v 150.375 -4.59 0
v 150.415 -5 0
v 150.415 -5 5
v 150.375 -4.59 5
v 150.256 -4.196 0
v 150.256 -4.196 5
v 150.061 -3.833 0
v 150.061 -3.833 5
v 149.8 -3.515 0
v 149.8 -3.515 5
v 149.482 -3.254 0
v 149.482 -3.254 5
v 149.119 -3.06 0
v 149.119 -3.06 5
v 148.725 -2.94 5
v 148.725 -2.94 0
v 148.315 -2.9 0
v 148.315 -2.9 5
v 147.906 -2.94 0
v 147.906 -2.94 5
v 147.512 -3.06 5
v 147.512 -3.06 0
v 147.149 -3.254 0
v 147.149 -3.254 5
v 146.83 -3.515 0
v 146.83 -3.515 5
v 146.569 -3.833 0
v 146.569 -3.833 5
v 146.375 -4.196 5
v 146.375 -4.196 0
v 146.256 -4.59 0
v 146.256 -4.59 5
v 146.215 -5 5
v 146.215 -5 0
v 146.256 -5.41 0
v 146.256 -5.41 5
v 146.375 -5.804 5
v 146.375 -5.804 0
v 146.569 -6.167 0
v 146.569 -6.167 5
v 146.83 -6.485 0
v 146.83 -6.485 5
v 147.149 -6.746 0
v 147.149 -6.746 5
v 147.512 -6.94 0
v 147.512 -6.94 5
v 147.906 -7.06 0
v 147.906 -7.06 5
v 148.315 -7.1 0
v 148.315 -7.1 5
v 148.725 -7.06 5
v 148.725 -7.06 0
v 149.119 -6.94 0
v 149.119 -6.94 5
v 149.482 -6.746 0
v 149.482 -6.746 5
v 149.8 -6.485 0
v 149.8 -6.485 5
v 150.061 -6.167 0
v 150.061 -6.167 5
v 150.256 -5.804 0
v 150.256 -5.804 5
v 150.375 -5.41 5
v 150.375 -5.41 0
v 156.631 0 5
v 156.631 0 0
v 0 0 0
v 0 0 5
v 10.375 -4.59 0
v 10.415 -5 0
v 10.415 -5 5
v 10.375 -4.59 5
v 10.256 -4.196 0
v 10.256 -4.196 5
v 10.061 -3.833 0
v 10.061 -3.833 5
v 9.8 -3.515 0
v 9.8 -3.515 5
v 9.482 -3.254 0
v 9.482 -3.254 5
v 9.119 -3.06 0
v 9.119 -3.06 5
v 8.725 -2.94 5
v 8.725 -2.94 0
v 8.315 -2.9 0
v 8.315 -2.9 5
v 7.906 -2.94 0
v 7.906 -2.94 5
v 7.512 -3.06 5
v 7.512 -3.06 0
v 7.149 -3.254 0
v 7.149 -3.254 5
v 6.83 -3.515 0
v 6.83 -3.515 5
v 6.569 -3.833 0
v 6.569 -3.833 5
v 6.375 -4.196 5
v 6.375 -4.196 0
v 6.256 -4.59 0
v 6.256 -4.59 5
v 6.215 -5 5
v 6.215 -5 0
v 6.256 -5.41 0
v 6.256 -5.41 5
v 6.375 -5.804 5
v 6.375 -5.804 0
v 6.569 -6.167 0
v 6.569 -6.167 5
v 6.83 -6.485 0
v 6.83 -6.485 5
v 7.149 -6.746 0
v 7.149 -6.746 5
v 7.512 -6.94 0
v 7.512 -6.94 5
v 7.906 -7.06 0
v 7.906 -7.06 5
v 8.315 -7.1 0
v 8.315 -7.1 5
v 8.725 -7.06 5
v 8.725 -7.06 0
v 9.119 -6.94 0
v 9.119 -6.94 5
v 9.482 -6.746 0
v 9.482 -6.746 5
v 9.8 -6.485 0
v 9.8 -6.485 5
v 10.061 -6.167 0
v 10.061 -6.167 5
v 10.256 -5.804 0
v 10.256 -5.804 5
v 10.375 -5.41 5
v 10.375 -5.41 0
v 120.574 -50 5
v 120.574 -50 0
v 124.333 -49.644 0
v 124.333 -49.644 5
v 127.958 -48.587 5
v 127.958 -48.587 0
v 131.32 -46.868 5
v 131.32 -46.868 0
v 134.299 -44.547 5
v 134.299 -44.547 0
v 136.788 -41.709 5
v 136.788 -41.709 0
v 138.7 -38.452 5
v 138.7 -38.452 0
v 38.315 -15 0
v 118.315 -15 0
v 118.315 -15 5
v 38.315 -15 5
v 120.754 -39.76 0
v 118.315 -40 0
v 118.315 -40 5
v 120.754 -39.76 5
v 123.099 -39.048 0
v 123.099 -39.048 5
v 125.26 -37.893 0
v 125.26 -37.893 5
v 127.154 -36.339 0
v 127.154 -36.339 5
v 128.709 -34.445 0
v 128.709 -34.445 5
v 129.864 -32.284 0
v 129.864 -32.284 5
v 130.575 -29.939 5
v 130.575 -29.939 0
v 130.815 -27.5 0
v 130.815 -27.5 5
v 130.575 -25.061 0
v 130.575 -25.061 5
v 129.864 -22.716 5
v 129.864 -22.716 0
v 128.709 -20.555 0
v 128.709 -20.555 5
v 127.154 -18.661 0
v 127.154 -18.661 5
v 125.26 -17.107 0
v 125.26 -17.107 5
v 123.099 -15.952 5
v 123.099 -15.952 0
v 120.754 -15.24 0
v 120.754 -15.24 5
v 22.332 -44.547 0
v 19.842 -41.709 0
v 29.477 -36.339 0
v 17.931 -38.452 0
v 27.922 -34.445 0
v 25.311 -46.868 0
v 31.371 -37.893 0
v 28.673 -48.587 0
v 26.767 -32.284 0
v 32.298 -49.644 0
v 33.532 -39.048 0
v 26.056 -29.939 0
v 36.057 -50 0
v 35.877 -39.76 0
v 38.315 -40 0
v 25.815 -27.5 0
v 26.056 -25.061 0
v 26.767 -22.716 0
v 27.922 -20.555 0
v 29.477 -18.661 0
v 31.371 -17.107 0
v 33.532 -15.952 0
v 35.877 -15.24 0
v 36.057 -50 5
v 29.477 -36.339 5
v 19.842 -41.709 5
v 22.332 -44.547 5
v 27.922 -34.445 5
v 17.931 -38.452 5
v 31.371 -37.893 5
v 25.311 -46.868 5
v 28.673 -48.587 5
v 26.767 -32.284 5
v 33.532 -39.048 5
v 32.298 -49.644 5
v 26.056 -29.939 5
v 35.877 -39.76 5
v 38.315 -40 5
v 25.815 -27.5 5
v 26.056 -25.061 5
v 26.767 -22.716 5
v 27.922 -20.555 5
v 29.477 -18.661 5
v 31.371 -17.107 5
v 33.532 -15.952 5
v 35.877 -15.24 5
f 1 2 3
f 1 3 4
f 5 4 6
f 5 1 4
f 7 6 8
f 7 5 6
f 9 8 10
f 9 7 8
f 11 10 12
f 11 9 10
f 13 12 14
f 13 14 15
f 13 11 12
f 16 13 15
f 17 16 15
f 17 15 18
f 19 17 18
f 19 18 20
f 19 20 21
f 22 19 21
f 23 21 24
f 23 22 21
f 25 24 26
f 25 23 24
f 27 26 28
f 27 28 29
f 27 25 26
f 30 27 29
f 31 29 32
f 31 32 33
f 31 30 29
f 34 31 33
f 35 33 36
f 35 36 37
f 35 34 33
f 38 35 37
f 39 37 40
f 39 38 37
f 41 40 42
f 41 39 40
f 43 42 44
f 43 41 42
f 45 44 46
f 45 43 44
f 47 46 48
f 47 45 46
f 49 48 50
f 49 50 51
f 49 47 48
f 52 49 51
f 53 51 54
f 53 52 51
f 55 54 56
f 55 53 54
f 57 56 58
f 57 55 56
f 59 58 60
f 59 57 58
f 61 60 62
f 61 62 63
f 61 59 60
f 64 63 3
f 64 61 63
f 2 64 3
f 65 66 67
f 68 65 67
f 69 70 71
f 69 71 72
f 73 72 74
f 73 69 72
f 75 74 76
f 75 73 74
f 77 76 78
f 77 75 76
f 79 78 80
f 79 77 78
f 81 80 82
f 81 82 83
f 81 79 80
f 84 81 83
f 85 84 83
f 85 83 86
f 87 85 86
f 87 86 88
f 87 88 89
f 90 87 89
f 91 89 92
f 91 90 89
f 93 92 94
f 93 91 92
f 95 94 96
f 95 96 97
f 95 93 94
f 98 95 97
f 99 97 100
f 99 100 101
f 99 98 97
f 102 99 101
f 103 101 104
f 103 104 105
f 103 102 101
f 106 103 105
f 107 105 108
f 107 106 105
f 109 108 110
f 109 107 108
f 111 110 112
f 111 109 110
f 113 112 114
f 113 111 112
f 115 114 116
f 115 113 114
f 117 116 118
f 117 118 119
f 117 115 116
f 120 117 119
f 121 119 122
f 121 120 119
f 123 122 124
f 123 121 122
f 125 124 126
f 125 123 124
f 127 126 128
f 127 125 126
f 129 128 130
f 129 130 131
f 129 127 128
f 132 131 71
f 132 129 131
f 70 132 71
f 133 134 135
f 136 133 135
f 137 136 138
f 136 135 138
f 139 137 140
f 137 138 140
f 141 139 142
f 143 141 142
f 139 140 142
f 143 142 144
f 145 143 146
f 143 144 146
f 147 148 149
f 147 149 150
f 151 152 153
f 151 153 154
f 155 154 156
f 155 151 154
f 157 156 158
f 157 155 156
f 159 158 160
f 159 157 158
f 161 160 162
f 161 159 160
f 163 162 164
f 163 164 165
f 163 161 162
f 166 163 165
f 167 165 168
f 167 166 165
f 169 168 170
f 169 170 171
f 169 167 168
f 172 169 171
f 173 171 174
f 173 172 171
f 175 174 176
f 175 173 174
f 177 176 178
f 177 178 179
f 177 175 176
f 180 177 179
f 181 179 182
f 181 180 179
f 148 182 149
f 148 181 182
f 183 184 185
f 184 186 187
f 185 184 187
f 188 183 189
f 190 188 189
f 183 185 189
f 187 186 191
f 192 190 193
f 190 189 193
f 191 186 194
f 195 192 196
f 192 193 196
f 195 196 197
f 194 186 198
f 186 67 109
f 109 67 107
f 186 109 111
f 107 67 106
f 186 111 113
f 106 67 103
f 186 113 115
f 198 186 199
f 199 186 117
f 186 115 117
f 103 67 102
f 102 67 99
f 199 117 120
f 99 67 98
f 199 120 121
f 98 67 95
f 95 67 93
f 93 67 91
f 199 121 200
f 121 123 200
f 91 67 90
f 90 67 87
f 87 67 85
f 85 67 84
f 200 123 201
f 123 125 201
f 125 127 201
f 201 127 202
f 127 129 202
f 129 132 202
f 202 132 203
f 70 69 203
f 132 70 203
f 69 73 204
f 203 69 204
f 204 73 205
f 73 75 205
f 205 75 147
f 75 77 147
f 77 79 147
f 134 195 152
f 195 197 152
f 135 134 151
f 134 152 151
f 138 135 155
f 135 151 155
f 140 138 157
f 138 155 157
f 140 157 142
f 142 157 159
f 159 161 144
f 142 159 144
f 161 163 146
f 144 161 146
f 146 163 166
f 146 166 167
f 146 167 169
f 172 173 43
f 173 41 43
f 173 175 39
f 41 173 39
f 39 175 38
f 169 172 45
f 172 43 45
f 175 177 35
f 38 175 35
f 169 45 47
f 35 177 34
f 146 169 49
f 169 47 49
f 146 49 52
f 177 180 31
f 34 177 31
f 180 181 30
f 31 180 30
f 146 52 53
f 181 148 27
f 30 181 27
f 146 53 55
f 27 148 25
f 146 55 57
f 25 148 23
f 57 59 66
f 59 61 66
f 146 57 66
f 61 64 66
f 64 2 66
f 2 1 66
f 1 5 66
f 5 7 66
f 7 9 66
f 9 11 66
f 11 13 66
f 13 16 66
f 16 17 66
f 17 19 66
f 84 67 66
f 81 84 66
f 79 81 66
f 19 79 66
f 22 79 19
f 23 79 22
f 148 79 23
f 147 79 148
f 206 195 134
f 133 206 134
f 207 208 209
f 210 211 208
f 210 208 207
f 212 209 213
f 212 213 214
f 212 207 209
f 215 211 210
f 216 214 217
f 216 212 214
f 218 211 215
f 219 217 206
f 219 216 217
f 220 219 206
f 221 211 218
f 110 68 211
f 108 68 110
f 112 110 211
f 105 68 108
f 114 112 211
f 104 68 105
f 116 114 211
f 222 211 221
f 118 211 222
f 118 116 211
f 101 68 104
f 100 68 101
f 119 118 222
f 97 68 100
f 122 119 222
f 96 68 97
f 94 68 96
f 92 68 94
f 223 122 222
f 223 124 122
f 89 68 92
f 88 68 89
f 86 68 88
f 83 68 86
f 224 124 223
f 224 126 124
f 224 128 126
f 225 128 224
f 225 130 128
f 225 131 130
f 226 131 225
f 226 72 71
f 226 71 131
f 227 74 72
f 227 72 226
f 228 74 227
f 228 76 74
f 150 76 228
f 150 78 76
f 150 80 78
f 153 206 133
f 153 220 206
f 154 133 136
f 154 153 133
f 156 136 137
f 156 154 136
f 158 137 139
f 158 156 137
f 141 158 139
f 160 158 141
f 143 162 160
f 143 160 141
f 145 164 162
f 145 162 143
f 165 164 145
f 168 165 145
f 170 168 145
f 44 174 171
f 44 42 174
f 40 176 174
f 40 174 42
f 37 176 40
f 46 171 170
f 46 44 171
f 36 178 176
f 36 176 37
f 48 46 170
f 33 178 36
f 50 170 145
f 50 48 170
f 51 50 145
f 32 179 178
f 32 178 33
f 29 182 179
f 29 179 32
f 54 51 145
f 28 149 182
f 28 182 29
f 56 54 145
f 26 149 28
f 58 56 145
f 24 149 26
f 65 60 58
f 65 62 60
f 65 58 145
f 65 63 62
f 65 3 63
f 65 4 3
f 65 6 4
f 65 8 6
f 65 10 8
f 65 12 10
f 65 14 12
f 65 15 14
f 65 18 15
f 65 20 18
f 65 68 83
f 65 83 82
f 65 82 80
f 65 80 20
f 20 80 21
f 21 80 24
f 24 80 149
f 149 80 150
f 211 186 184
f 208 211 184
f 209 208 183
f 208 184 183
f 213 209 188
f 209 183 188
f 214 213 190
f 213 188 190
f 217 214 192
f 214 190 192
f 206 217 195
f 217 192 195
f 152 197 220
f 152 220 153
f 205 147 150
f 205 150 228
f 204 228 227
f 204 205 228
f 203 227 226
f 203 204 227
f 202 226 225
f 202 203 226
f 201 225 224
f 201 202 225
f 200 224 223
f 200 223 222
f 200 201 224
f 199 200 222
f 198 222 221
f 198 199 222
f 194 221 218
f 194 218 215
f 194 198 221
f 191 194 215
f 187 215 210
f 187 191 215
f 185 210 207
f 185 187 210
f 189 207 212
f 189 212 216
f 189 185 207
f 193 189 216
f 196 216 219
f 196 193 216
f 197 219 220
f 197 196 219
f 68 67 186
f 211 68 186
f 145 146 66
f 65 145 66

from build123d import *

# Parameters (mm, degrees)
SKETCH1_R           = 2.1
BOSS_EXTRUDE1_DEPTH = 5


with BuildPart() as part:
    # Sketch1 → Boss-Extrude1 (new body)
    with BuildSketch(Plane.XY):
        with BuildLine():
            Line((156.630765815, 0), (0, 0))
            Line((0, 0), (17.930632383, -38.452365235))
            ThreePointArc((17.930632383, -38.452365235), (25.310795957, -46.867828916), (36.056788124, -50))
            Line((36.056788124, -50), (120.573977692, -50))
            ThreePointArc((120.573977692, -50), (131.319969859, -46.867828916), (138.700133432, -38.452365235))
            Line((138.700133432, -38.452365235), (156.630765815, 0))
        make_face()
        with Locations((148.315382907, -5)):
            Circle(SKETCH1_R, mode=Mode.SUBTRACT)
        with Locations((8.315382909, -5)):
            Circle(SKETCH1_R, mode=Mode.SUBTRACT)
        with BuildLine():
            Line((118.315382908, -15), (38.315382908, -15))
            ThreePointArc((38.315382908, -15), (25.815382908, -27.5), (38.315382908, -40))
            Line((38.315382908, -40), (118.315382908, -40))
            ThreePointArc((118.315382908, -40), (130.815382908, -27.5), (118.315382908, -15))
        make_face(mode=Mode.SUBTRACT)
    extrude(amount=BOSS_EXTRUDE1_DEPTH)


solid = part.part
